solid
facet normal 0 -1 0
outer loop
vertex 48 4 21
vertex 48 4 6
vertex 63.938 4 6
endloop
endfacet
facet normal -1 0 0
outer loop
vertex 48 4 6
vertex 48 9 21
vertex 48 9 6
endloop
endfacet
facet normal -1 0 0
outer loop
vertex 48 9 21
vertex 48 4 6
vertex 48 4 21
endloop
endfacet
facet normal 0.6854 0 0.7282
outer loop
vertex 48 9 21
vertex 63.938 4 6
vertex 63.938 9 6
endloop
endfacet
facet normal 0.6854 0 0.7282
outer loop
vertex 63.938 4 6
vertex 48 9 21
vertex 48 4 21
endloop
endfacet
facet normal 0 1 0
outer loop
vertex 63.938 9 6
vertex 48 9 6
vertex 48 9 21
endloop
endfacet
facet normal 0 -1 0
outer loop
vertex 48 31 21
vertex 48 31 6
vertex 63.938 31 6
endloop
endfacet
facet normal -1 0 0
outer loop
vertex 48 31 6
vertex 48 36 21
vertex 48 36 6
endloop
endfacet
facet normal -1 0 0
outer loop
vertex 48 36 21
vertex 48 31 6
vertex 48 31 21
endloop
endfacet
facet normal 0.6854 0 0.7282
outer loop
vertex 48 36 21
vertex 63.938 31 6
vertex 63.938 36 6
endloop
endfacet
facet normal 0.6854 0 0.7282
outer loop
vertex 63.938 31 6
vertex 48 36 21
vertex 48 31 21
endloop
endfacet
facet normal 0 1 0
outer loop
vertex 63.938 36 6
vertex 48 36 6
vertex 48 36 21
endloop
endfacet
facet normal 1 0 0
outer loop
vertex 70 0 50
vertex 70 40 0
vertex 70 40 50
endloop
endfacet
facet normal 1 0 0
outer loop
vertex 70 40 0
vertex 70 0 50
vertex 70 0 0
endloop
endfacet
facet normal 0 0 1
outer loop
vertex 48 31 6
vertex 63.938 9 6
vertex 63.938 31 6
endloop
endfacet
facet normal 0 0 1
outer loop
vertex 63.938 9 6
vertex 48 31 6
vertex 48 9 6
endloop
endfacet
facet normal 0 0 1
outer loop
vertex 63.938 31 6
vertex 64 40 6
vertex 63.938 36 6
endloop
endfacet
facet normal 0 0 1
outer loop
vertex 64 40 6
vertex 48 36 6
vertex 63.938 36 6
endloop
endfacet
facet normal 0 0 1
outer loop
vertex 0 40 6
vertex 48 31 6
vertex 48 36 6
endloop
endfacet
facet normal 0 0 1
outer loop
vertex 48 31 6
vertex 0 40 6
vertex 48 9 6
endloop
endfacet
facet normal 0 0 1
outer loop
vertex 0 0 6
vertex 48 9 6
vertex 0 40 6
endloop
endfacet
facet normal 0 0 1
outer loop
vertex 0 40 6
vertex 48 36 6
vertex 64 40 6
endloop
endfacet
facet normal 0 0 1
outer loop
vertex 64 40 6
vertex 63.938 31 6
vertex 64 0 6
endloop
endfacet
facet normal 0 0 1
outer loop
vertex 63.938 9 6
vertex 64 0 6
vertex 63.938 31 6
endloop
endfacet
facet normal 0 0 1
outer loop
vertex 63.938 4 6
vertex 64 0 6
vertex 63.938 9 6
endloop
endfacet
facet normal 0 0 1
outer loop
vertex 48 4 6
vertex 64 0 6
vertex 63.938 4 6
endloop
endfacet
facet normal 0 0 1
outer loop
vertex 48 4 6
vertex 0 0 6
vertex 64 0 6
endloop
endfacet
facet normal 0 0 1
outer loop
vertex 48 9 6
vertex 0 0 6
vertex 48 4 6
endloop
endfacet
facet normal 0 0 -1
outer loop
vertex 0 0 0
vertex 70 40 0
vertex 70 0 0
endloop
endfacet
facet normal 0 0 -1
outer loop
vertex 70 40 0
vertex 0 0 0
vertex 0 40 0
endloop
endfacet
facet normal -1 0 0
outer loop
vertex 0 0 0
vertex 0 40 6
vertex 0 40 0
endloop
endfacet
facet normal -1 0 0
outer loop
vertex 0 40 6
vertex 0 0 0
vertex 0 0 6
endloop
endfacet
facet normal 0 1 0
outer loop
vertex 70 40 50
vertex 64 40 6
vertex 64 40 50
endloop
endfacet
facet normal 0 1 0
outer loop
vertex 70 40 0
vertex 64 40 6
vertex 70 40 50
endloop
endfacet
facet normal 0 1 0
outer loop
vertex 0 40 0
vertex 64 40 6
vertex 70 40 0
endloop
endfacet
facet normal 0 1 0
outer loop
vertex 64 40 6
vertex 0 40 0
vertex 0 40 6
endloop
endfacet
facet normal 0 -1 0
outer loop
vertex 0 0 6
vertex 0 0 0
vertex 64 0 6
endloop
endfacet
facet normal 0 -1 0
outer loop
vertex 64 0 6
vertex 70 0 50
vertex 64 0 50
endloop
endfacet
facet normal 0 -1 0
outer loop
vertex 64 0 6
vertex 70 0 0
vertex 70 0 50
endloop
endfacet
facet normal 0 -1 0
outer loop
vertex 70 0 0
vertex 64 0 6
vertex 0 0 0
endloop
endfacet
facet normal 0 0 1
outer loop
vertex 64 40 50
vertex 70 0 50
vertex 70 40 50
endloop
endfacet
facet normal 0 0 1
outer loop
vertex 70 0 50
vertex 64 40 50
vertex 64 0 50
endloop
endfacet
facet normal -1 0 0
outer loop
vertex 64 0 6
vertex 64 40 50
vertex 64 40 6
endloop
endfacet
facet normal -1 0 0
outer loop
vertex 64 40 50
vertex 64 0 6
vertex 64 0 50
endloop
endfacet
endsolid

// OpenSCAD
$fn = 32;

// ----------------------------------------------------------------------
// Rib bracket: 2-gusset L bracket
// ----------------------------------------------------------------------

// --- parameters (mm) ---
base_l = 70;              // foot length, X
base_w = 40;              // foot width, Y
base_t = 6;               // foot thickness
plate_t = 6;              // upright plate thickness
plate_h = 50;             // overall height
gus_l = 16;               // gusset leg along the foot
gus_h = 16;               // gusset height
gus_t = 5;                // gusset thickness
gus_edge = 4;             // gusset margin from the foot edge
n_gus = 2;                // gusset count

gus_pitch = (base_w - 2 * gus_edge - gus_t) / (n_gus - 1);  // gusset pitch

union() {
  cube([base_l, base_w, base_t]);
  translate([base_l - plate_t, 0, base_t - 1])
    cube([plate_t, base_w, plate_h - base_t + 1]);
  for (i = [0 : n_gus - 1])
    translate([base_l - plate_t - gus_l, gus_edge + i * gus_pitch, base_t - 1])
      rotate([-90, 0, 0])
        linear_extrude(height = gus_t)
          polygon(points = [[0, 0], [gus_l + 1, 0], [0, -gus_h]]);
}
